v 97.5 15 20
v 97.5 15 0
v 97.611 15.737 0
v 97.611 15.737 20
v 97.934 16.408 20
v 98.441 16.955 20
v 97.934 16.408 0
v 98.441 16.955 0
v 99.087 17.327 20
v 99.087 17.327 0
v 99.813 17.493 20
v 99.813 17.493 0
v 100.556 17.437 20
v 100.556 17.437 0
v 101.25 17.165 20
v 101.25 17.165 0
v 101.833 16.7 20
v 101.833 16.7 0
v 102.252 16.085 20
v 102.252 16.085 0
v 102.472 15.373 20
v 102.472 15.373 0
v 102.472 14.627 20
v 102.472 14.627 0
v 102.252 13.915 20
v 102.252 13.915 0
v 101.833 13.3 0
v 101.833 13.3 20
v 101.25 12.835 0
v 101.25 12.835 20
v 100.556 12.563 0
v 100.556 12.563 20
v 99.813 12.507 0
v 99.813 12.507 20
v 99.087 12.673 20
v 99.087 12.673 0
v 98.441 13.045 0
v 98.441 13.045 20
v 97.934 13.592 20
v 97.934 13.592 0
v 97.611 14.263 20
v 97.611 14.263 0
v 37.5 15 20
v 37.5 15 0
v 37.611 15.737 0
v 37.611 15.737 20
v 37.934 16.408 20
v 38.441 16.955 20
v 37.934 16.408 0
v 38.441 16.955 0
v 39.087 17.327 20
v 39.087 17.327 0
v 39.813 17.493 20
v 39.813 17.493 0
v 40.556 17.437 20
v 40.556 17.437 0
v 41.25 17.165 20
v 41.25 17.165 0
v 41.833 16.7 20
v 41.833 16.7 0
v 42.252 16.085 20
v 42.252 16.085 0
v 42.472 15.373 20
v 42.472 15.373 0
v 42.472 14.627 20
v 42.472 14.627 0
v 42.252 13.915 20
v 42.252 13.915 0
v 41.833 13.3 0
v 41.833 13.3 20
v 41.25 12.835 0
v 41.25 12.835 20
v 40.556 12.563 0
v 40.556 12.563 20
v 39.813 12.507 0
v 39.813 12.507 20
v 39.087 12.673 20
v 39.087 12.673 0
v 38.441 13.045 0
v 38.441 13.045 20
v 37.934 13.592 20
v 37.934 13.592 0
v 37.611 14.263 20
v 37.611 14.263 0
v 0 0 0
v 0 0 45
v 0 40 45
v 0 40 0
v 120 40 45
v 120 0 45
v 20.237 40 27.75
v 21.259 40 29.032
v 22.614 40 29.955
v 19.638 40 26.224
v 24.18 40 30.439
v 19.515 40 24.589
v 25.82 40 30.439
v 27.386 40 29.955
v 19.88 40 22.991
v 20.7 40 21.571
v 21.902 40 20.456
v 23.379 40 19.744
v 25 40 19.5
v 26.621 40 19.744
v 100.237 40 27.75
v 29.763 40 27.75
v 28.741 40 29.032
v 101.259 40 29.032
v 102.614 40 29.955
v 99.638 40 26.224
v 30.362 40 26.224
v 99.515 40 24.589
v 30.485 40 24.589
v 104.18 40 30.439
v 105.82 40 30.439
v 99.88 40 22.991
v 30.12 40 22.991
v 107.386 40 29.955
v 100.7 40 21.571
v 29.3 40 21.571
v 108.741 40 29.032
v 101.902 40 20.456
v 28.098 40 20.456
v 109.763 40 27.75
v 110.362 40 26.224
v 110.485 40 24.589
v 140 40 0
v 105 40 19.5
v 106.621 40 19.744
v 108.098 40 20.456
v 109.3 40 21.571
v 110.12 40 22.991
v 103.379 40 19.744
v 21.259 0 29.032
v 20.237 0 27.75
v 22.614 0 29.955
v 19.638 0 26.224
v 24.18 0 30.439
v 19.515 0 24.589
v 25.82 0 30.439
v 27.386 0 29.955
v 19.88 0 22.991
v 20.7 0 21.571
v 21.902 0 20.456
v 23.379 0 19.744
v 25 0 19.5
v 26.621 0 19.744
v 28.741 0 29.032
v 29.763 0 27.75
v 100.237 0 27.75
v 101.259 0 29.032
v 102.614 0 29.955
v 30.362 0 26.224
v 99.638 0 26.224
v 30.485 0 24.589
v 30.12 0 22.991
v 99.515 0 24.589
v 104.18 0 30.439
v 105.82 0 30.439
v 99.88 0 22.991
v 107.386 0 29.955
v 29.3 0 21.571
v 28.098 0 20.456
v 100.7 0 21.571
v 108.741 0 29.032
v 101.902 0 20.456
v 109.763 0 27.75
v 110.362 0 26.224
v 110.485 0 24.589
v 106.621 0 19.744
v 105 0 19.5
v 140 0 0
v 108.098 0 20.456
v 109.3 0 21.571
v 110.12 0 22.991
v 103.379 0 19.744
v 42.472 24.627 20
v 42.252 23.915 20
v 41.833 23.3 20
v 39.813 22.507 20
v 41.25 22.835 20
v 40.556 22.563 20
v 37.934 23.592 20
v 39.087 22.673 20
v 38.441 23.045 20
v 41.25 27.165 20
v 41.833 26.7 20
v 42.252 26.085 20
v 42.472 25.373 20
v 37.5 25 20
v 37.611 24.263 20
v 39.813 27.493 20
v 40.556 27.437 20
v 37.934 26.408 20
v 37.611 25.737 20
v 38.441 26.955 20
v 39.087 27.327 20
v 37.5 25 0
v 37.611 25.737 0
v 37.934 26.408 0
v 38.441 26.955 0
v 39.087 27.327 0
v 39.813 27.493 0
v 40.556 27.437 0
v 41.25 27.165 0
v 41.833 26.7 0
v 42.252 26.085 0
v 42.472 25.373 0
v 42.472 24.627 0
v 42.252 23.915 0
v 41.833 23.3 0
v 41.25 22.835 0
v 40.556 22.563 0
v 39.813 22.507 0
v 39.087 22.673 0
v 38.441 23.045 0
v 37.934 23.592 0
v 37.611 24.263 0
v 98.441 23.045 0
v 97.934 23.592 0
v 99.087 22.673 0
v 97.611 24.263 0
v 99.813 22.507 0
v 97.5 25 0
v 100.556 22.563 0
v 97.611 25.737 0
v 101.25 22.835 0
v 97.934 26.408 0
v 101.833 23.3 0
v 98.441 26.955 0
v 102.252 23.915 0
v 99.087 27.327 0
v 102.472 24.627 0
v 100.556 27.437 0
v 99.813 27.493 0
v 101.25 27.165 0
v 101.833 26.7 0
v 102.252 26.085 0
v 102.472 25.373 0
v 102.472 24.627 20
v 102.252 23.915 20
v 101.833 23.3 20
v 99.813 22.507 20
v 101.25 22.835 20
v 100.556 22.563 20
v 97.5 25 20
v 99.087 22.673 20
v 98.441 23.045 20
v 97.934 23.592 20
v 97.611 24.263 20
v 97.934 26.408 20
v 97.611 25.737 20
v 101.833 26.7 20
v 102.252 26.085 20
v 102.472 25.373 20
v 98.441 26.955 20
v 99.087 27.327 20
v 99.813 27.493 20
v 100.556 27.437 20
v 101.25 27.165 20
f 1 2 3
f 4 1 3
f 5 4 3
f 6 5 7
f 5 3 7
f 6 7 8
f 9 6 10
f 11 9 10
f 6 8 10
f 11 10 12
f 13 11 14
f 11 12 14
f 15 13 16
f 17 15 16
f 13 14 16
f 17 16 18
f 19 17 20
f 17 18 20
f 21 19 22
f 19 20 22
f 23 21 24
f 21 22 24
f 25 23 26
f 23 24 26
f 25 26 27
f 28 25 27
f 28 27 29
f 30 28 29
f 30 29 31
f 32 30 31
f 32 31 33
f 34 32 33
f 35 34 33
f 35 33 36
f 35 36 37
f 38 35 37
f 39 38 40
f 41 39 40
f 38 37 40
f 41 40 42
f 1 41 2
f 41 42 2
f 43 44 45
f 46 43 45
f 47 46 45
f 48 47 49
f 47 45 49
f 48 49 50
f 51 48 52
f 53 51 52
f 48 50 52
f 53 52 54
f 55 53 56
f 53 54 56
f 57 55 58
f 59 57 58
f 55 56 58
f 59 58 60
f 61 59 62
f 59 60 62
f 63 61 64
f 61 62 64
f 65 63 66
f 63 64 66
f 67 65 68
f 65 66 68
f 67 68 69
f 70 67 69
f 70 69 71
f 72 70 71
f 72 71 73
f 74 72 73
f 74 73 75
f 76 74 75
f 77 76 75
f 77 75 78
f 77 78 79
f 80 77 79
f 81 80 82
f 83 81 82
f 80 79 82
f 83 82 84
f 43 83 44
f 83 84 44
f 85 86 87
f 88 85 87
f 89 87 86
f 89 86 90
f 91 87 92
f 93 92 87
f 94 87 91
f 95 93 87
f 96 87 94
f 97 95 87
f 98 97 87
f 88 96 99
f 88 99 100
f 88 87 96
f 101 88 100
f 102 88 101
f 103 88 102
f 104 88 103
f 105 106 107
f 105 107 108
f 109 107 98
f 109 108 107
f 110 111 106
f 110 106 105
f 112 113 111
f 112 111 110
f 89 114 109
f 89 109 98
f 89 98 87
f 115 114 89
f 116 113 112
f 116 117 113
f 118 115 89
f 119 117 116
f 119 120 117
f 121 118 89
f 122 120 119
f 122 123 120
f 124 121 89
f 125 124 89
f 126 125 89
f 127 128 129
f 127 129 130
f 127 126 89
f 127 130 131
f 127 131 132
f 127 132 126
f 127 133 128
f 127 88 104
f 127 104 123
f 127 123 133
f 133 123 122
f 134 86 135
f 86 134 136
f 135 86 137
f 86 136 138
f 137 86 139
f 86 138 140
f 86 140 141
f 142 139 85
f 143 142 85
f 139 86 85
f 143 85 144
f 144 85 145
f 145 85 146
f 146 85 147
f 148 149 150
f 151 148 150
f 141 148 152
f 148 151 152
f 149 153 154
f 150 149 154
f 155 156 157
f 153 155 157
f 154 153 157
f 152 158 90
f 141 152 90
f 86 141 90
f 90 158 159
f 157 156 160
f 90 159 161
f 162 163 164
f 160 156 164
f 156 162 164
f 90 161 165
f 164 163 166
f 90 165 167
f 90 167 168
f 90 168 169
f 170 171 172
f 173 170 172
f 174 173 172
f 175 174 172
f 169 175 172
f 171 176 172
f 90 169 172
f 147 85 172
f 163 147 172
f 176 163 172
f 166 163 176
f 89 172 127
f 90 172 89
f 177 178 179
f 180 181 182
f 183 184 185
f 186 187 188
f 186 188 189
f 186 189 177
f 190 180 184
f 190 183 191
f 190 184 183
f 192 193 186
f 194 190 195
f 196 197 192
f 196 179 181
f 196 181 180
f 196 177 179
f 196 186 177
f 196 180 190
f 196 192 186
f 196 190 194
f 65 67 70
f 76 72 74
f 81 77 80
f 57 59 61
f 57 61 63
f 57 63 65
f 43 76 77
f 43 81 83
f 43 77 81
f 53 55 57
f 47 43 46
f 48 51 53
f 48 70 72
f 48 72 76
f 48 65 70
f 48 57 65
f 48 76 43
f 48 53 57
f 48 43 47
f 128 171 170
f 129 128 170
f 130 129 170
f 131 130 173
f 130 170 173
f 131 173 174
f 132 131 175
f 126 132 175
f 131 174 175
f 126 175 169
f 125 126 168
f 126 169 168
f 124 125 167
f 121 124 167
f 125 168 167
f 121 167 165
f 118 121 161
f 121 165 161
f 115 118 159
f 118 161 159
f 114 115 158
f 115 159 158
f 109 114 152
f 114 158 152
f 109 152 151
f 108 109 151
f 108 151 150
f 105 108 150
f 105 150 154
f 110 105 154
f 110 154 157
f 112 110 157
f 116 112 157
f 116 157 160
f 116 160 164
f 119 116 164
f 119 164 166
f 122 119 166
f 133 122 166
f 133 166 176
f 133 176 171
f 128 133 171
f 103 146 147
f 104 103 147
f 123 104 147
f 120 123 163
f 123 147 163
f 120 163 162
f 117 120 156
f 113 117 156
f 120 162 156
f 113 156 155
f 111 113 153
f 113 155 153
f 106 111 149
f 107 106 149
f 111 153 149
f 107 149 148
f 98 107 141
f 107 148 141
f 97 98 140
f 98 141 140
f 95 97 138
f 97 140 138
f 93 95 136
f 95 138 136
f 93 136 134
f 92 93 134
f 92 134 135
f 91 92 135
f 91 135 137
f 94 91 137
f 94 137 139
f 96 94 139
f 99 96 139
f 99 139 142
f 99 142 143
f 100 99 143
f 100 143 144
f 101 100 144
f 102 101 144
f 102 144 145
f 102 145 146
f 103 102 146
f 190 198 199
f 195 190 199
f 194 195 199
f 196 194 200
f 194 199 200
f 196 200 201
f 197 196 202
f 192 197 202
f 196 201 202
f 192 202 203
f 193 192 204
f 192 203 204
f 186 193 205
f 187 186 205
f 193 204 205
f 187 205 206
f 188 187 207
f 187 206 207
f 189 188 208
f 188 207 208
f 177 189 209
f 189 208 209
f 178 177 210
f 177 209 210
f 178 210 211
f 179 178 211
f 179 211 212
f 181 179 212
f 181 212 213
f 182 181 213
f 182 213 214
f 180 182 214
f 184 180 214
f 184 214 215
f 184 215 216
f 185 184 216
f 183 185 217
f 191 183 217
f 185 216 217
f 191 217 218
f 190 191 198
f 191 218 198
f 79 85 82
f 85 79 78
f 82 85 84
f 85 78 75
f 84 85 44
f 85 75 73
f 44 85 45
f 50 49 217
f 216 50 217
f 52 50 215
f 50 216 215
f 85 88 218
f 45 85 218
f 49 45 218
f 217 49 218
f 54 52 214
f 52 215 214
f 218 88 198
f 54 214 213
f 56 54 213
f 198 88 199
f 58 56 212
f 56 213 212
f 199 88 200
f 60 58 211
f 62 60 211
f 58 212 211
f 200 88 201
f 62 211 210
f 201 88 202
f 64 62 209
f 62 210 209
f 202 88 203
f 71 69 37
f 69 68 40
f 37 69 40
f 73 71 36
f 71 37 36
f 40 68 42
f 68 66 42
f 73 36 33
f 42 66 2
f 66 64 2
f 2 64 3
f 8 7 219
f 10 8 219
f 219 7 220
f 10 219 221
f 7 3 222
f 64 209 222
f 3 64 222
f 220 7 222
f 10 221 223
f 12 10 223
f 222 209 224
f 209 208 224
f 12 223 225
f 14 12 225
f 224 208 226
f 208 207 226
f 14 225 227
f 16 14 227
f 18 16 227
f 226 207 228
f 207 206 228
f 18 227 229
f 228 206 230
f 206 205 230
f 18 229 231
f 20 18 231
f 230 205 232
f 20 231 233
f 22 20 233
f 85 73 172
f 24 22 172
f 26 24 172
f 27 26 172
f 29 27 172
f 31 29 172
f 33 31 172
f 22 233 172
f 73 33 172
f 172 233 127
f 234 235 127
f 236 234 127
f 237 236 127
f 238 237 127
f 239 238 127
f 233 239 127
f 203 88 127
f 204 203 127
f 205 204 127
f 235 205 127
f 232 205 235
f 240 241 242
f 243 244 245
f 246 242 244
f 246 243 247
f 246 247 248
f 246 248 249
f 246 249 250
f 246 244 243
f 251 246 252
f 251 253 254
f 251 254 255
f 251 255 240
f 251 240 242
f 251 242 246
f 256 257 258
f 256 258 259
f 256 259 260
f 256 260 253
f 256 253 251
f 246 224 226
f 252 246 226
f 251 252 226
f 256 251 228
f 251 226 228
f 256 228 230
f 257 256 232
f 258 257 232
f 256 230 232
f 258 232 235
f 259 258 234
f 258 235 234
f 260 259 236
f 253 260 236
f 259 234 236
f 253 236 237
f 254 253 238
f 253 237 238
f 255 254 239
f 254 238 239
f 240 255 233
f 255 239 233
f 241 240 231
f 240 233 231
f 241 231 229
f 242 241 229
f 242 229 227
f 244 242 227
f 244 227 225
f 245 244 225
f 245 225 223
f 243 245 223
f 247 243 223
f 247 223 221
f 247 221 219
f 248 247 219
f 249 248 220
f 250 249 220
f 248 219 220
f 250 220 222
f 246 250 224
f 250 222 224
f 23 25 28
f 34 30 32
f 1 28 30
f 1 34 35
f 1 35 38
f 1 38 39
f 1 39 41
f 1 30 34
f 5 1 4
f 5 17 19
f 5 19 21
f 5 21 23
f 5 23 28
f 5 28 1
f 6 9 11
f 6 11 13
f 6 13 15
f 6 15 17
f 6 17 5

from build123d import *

# Parameters (mm, degrees)
SKETCH1_W           = 140
SKETCH1_H           = 40
BOSS_EXTRUDE1_DEPTH = 45
SKETCH2_R           = 5.5
CUT_EXTRUDE1_DEPTH  = 153.397506541
SKETCH3_R           = 2.5
CUT_EXTRUDE2_DEPTH  = 20


with BuildPart() as part:
    # Sketch1 → Boss-Extrude1 (new body)
    with BuildSketch(Plane.XY):
        with Locations((70, 20)):
            Rectangle(SKETCH1_W, SKETCH1_H)
    extrude(amount=BOSS_EXTRUDE1_DEPTH)

    # Sketch2 → Cut-Extrude1 (cut, through all)
    with BuildSketch(Plane.XZ):
        with Locations(Location((25, 25, 0), (0, 0, 270))):
            Circle(SKETCH2_R)
        with Locations(Location((105, 25, 0), (0, 0, 270))):
            Circle(SKETCH2_R)
        Polygon((120, 45), (140, 45), (140, 0), align=None)
    extrude(amount=-CUT_EXTRUDE1_DEPTH, mode=Mode.SUBTRACT)

    # Sketch3 → Cut-Extrude2 (cut)
    with BuildSketch(Plane(origin=(0, 0, 0), x_dir=(-1, 0, 0), z_dir=(0, 0, -1))):
        with Locations((-40, 25)):
            Circle(SKETCH3_R)
        with Locations((-100, 25)):
            Circle(SKETCH3_R)
        with Locations((-40, 15)):
            Circle(SKETCH3_R)
        with Locations((-100, 15)):
            Circle(SKETCH3_R)
    extrude(amount=-CUT_EXTRUDE2_DEPTH, mode=Mode.SUBTRACT)


solid = part.part
